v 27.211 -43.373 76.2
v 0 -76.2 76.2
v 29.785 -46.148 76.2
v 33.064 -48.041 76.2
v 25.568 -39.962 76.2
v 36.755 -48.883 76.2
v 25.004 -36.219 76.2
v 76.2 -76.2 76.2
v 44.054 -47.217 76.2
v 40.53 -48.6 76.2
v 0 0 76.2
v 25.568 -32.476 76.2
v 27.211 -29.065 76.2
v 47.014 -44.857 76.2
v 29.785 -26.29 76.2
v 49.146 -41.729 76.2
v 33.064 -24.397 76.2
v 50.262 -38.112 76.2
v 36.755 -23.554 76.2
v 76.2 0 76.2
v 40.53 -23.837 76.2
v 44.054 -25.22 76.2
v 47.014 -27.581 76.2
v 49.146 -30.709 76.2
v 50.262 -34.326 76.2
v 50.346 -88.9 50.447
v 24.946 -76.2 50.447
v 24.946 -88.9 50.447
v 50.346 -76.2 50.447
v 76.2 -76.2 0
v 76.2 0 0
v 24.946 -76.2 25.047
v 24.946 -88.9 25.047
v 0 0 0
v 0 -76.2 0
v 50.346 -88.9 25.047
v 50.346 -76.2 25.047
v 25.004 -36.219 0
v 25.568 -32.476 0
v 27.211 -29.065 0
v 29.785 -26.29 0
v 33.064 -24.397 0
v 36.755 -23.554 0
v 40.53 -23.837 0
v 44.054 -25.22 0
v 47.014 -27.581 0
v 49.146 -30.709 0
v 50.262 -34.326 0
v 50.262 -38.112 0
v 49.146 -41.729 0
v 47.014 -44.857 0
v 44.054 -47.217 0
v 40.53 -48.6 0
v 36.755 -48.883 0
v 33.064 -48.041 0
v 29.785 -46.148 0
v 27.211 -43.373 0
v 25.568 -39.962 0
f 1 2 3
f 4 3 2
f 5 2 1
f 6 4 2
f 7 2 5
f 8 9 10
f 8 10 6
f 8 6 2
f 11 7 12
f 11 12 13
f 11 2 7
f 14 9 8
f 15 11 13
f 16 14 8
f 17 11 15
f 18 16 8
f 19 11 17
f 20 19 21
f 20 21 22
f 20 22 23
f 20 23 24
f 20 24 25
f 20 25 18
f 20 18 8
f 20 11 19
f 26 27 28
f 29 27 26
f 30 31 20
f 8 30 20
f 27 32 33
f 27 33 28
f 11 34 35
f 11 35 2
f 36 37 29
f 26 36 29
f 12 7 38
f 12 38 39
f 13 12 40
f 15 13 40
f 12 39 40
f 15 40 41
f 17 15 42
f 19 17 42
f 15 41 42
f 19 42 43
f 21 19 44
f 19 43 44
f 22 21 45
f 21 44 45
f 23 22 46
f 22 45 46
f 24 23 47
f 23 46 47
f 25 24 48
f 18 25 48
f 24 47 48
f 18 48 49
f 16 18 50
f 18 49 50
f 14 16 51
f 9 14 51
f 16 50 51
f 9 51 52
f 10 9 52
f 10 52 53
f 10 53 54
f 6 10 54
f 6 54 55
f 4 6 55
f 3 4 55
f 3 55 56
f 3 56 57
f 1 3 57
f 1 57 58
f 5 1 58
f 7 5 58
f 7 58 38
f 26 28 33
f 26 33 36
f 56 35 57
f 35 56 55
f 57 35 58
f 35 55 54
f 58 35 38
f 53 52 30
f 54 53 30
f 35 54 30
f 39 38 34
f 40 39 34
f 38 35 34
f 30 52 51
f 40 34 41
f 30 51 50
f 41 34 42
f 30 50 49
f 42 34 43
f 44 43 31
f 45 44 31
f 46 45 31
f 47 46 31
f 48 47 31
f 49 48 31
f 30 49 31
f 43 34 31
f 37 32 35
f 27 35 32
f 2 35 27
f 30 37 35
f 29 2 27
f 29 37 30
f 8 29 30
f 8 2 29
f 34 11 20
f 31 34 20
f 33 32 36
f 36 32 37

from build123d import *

# Parameters (mm, degrees)
F0_W     = 76.2
F0_H     = 76.2
F1_DEPTH = 76.2
F3_D     = 25.4
F4_W     = 25.4
F4_H     = 25.4
F5_DEPTH = 12.7


# Not quite as in the source:
# - the program builds the solid bodies; features that only make, move or delete a surface that nothing else refers to are left out


with BuildPart() as f1:
    # F0 (on Front) → F1 (new body)
    with BuildSketch(Plane.XZ):
        with Locations((38.1, 38.1)):
            Rectangle(F0_W, F0_H)
    extrude(amount=F1_DEPTH)

    # F3 (through all)
    with Locations(Plane.XY.offset(76.2)):
        with Locations((37.7037897706, -36.2189039588)):
            Hole(F3_D / 2)

    # F4 (on face) → F5 (join)
    with BuildSketch(Plane.XZ.offset(76.2)):
        with Locations((37.6457564205, 37.7473003834)):
            Rectangle(F4_W, F4_H)
    extrude(amount=F5_DEPTH)


solid = f1.part
